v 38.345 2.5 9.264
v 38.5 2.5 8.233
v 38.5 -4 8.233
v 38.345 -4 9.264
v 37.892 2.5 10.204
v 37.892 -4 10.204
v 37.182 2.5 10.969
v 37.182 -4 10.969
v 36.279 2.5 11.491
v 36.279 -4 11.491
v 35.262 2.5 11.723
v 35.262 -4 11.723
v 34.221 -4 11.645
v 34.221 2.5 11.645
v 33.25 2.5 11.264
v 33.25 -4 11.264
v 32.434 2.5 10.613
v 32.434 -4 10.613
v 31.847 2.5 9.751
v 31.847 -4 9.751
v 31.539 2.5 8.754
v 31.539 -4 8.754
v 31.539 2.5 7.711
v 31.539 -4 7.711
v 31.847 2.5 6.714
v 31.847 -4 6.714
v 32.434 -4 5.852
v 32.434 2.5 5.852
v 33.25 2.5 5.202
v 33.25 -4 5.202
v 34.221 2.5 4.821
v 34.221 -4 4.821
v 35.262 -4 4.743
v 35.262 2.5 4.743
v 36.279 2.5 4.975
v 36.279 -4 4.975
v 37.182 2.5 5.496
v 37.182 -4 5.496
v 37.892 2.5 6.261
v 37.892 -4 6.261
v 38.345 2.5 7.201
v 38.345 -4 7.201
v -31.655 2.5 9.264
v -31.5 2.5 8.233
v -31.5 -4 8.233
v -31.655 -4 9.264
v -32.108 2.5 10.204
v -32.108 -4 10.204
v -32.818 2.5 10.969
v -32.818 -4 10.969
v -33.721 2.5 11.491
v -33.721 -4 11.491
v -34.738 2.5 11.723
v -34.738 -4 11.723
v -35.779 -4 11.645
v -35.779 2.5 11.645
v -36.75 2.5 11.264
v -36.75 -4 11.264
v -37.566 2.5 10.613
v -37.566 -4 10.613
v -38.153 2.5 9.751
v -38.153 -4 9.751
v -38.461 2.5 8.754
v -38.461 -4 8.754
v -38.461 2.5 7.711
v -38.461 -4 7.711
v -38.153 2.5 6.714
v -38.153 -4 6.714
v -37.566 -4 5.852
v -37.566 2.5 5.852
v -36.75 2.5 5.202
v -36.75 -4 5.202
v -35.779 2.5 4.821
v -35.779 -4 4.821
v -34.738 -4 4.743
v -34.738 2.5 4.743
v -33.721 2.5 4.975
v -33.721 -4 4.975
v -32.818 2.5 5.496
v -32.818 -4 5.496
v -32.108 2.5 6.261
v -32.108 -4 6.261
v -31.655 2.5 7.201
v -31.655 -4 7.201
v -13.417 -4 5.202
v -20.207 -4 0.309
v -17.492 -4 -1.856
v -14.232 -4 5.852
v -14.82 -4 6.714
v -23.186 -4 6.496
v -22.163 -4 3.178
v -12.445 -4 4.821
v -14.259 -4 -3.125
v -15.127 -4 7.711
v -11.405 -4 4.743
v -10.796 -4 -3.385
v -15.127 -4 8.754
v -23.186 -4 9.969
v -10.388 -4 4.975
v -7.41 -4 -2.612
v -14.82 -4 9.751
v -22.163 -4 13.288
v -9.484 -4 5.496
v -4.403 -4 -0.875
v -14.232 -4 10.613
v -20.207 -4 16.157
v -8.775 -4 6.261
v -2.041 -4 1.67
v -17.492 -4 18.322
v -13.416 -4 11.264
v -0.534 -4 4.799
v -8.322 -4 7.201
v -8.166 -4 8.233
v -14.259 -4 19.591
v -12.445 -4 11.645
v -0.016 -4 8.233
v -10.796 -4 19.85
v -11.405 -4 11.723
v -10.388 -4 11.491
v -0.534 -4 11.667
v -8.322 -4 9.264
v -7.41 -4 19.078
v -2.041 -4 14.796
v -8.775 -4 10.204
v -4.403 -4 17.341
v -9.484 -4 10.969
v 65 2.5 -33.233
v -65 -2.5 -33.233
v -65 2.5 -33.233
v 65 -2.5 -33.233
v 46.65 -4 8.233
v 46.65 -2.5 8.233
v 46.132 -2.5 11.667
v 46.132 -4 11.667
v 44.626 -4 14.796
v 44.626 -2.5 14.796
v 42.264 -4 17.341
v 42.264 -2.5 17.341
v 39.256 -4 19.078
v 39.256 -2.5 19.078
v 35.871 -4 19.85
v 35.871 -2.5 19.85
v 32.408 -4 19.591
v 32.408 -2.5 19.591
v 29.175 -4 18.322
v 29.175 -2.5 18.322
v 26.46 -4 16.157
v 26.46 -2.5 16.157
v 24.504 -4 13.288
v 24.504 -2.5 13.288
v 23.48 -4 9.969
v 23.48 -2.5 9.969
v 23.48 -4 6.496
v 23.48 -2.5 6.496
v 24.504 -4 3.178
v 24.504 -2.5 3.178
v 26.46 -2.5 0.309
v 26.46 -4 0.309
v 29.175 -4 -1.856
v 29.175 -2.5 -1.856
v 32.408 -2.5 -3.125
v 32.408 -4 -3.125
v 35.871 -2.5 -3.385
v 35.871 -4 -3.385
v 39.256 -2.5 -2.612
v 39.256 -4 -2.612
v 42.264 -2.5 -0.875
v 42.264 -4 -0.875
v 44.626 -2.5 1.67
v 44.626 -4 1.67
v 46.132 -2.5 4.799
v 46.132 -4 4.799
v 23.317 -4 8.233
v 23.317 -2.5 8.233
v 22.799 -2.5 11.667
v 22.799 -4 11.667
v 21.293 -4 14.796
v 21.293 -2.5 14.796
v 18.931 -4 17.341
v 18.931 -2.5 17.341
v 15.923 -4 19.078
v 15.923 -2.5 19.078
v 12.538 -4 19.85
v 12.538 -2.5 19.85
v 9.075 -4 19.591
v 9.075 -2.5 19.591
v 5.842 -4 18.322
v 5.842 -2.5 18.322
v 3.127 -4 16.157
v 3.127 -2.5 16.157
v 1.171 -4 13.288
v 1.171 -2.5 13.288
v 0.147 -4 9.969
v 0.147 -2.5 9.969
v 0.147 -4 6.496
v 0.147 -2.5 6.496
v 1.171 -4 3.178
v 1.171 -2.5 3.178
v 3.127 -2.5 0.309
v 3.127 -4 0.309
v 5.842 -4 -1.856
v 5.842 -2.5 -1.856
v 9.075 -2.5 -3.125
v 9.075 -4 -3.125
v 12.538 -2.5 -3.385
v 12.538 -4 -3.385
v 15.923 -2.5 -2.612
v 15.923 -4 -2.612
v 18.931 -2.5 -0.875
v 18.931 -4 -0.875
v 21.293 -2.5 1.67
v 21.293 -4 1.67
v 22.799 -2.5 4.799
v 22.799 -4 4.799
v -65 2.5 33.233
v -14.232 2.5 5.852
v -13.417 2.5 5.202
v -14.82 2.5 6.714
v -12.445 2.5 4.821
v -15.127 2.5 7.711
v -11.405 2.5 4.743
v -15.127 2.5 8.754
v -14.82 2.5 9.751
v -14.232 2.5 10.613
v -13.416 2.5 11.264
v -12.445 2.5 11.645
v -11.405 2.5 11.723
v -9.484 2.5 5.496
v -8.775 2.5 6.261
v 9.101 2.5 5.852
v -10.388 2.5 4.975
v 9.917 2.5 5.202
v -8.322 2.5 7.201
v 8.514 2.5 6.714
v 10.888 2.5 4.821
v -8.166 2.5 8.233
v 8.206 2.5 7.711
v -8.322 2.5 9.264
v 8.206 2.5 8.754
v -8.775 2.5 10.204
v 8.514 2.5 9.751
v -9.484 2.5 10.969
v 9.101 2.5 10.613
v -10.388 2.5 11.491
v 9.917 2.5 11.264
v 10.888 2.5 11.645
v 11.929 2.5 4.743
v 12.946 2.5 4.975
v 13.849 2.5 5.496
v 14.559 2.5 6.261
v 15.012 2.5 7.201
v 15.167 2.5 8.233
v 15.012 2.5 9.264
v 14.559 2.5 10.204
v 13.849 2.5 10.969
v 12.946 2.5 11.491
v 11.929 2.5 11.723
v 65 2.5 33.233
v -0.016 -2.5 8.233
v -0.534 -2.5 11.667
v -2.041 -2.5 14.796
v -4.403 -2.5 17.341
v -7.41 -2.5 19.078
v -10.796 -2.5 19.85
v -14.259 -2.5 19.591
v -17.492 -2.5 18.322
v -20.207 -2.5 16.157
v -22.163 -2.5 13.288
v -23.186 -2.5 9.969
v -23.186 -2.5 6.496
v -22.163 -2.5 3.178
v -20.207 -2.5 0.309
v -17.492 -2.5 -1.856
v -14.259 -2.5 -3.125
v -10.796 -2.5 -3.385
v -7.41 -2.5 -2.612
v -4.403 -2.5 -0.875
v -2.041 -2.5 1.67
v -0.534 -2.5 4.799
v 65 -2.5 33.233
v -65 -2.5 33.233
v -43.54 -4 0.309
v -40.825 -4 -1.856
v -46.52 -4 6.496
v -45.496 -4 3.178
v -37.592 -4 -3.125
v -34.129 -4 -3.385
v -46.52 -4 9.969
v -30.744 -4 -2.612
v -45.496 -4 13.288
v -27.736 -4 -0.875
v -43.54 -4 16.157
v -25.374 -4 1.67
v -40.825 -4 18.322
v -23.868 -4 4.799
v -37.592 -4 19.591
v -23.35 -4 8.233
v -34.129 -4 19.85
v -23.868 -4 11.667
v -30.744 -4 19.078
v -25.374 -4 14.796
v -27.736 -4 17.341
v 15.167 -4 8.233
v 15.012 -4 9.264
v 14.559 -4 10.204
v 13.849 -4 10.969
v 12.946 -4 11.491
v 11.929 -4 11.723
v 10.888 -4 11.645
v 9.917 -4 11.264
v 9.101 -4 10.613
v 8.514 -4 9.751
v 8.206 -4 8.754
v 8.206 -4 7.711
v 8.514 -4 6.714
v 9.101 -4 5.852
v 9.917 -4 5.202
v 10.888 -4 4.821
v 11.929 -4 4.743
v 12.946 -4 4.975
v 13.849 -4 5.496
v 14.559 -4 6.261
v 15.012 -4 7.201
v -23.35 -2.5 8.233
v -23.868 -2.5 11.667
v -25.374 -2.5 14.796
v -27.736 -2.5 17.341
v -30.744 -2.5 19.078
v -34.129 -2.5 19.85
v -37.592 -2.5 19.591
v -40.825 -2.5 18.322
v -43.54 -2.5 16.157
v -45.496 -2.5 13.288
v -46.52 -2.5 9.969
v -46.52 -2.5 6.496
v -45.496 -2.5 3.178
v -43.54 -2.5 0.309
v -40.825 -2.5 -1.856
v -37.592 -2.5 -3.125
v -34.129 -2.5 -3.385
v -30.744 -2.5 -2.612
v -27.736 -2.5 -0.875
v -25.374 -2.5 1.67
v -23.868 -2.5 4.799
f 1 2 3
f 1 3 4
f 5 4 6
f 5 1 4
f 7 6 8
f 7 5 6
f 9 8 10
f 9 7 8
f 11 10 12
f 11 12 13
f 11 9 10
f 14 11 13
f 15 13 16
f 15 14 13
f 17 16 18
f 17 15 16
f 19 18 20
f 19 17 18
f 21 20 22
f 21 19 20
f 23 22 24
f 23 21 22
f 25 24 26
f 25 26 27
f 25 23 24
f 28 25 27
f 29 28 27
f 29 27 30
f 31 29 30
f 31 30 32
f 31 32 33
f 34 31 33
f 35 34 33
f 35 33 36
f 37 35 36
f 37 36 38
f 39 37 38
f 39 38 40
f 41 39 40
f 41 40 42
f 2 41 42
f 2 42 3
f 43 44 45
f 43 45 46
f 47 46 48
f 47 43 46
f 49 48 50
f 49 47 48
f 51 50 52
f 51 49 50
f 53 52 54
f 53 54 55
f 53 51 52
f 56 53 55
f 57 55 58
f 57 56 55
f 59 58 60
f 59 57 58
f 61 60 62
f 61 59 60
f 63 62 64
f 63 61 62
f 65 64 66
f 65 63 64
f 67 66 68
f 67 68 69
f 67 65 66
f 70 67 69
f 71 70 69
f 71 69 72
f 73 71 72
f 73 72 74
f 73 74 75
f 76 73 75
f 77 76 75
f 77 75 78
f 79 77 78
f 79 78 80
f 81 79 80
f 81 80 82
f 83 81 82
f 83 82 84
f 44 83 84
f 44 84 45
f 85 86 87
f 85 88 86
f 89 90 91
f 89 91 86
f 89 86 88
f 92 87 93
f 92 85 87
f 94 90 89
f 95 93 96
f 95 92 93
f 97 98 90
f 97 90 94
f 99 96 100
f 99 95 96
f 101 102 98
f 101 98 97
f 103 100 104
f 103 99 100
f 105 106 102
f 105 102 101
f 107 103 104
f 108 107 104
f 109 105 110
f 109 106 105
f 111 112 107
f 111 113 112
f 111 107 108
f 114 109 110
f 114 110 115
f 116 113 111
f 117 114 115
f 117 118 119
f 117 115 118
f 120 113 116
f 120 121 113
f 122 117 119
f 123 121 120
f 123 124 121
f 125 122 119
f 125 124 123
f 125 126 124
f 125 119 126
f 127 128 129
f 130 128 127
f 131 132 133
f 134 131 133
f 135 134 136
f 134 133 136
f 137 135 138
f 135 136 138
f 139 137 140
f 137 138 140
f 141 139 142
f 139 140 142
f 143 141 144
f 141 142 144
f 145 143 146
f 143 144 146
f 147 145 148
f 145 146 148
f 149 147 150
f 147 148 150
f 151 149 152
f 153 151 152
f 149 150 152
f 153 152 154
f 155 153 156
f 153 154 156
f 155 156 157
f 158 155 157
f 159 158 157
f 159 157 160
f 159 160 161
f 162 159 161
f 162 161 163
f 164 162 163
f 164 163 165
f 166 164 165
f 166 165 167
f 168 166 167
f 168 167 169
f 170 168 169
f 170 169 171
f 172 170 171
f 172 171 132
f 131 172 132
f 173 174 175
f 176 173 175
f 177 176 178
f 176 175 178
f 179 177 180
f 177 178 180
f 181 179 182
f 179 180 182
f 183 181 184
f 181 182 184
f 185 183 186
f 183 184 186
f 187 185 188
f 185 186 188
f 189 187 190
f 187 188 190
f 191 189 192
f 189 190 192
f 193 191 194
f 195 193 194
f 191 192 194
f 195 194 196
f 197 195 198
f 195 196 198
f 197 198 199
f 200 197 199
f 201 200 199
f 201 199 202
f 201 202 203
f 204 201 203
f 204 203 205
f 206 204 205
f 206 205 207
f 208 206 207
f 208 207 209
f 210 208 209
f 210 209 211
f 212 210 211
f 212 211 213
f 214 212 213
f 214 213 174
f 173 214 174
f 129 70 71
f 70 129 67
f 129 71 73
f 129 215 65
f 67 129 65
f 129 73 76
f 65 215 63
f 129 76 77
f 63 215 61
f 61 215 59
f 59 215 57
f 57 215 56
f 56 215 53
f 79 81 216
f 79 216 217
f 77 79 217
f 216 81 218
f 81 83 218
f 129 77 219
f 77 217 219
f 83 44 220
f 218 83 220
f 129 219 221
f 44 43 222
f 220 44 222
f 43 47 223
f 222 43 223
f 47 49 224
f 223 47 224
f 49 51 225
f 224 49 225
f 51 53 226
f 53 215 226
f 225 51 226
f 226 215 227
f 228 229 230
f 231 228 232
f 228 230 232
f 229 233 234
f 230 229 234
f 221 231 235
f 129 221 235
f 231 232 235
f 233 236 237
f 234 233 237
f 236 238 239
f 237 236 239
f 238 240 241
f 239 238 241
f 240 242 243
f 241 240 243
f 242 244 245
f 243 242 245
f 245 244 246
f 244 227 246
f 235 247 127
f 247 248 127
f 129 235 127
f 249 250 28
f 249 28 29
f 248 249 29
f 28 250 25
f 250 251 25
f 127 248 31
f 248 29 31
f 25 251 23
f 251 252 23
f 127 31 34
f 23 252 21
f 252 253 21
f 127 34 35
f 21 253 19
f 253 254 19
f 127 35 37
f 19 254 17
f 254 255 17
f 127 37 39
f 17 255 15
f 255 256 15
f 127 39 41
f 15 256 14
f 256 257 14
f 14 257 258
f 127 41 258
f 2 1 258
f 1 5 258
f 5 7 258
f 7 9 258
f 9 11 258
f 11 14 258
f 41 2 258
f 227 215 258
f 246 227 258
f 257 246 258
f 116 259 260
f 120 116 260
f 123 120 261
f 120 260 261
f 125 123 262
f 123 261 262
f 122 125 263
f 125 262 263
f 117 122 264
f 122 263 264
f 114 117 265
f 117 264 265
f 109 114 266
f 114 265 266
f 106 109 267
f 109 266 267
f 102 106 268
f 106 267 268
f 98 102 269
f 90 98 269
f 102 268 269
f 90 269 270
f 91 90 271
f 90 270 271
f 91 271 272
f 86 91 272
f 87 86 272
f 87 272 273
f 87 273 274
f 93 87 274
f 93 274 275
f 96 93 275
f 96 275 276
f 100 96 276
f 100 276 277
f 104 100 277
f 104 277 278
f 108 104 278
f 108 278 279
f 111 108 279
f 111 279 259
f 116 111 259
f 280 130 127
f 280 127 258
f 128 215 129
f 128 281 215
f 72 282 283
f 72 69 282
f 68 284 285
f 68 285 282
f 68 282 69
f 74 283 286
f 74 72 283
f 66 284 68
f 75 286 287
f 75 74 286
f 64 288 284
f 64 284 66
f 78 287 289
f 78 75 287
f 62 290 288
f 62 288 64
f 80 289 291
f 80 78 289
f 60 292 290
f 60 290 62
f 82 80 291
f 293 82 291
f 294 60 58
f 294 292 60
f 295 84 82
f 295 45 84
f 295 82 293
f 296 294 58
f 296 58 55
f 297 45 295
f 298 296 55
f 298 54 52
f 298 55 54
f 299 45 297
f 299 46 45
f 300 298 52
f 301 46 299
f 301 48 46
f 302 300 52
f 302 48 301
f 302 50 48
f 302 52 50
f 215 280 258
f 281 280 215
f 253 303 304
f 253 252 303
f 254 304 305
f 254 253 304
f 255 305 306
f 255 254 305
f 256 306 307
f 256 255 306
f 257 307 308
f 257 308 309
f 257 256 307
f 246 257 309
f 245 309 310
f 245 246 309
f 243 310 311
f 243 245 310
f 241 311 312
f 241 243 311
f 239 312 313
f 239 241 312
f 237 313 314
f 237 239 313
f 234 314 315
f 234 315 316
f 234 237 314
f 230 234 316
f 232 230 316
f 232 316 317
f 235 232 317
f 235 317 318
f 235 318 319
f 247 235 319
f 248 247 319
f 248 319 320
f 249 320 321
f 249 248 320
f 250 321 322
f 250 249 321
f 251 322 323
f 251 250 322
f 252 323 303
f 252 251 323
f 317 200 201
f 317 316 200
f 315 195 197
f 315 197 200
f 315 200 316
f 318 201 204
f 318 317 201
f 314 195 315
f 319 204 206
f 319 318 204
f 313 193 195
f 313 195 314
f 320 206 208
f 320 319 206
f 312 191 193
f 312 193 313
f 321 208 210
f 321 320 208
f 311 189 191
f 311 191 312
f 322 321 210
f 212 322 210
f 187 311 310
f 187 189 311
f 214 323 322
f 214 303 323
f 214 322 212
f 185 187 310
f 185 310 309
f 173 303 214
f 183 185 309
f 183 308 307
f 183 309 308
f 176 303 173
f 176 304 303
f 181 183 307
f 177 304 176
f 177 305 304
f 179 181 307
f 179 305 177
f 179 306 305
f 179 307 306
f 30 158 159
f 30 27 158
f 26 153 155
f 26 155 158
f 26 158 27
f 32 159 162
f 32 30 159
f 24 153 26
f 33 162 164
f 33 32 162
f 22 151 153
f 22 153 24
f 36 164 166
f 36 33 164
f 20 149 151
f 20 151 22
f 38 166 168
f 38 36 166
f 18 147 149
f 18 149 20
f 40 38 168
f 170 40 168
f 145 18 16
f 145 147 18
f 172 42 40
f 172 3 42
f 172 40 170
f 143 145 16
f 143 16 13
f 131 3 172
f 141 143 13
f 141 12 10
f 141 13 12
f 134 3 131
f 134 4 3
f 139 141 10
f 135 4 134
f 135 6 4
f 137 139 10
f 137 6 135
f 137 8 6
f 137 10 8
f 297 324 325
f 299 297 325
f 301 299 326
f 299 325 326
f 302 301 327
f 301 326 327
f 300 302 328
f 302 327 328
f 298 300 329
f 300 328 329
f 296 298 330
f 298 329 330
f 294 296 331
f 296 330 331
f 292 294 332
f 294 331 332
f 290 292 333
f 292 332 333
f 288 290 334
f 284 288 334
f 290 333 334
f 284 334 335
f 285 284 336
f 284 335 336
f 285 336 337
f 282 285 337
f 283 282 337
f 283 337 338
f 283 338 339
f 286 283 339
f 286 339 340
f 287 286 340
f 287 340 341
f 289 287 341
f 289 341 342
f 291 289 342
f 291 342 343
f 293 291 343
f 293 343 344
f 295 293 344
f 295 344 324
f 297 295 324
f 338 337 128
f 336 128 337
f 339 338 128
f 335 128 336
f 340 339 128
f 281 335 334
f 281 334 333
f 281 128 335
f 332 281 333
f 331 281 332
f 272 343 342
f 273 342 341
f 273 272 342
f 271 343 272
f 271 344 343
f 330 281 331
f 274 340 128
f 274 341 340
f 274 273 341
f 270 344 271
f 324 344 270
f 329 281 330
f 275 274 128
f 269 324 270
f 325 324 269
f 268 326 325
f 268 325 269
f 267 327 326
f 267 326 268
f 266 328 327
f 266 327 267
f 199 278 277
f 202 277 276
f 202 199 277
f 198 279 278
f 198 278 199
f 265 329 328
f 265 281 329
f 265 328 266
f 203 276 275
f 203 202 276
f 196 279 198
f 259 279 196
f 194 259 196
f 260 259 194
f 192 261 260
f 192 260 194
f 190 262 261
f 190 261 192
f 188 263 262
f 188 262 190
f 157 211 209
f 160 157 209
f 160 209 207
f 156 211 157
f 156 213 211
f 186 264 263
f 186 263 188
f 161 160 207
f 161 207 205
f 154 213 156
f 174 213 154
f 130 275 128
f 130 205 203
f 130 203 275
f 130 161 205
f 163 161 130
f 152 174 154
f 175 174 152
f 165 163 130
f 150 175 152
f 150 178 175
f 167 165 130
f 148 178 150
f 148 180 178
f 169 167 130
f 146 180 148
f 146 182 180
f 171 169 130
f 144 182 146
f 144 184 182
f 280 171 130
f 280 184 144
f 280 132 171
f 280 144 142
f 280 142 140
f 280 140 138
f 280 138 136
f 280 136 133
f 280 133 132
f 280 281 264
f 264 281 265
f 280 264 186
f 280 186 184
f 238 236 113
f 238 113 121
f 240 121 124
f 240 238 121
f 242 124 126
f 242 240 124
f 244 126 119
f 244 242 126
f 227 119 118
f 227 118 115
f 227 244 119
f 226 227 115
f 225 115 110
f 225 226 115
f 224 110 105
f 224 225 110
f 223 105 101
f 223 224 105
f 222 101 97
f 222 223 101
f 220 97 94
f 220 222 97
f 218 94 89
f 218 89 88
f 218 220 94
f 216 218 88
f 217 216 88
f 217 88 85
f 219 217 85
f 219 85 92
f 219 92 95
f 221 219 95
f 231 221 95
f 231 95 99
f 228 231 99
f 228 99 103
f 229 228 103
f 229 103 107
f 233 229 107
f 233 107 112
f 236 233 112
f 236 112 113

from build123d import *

# Parameters (mm, degrees)
F0_R     = 11.65
F0_R_2   = 3.5
F1_DEPTH = 2.5
F2_DEPTH = 4
F3_DEPTH = 4
F4_DEPTH = 4
F5_DEPTH = 4
F6_DEPTH = 4


with BuildPart() as f1:
    # F0 (on Front) → F1 (new body, symmetric)
    with BuildSketch(Plane.XZ):
        Polygon((0, 33.2328369043), (-65, 33.2328369043), (-65, -33.2328369043), (65, -33.2328369043), (65, 33.2328369043), align=None)
        with Locations((-35, 8.2328369043)):
            Circle(F0_R, mode=Mode.SUBTRACT)
        with Locations((-11.6665, 8.2328369043)):
            Circle(F0_R, mode=Mode.SUBTRACT)
        with Locations((11.667, 8.2328369043)):
            Circle(F0_R, mode=Mode.SUBTRACT)
        with Locations((35, 8.2328369043)):
            Circle(F0_R, mode=Mode.SUBTRACT)
        with Locations((-11.6665, 8.2328369043)):
            Circle(F0_R)
        with Locations((-11.6665, 8.2328369043)):
            Circle(F0_R_2, mode=Mode.SUBTRACT)
        with Locations((11.667, 8.2328369043)):
            Circle(F0_R)
        with Locations((11.667, 8.2328369043)):
            Circle(F0_R_2, mode=Mode.SUBTRACT)
        with Locations((35, 8.2328369043)):
            Circle(F0_R)
        with Locations((35, 8.2328369043)):
            Circle(F0_R_2, mode=Mode.SUBTRACT)
        with Locations((-35, 8.2328369043)):
            Circle(F0_R)
        with Locations((-35, 8.2328369043)):
            Circle(F0_R_2, mode=Mode.SUBTRACT)
    extrude(amount=F1_DEPTH, both=True)

    # F0 (on Front) → F2 (join)
    with BuildSketch(Plane.XZ):
        with Locations((35, 8.2328369043)):
            Circle(F0_R)
        with Locations((35, 8.2328369043)):
            Circle(F0_R_2, mode=Mode.SUBTRACT)
    extrude(amount=F2_DEPTH)

    # F0 (on Front) → F3 (join)
    with BuildSketch(Plane.XZ):
        with Locations((-35, 8.2328369043)):
            Circle(F0_R)
        with Locations((-35, 8.2328369043)):
            Circle(F0_R_2, mode=Mode.SUBTRACT)
    extrude(amount=F3_DEPTH)

    # F0 (on Front) → F4 (join)
    with BuildSketch(Plane.XZ):
        with Locations((-11.6665, 8.2328369043)):
            Circle(F0_R)
        with Locations((-11.6665, 8.2328369043)):
            Circle(F0_R_2, mode=Mode.SUBTRACT)
    extrude(amount=F4_DEPTH)

    # F0 (on Front) → F5 (join)
    with BuildSketch(Plane.XZ):
        with Locations((11.667, 8.2328369043)):
            Circle(F0_R)
        with Locations((11.667, 8.2328369043)):
            Circle(F0_R_2, mode=Mode.SUBTRACT)
    extrude(amount=F5_DEPTH)

    # F0 (on Front) → F6 (join)
    with BuildSketch(Plane.XZ):
        with Locations((11.667, 8.2328369043)):
            Circle(F0_R)
        with Locations((11.667, 8.2328369043)):
            Circle(F0_R_2, mode=Mode.SUBTRACT)
    extrude(amount=F6_DEPTH)


solid = f1.part
